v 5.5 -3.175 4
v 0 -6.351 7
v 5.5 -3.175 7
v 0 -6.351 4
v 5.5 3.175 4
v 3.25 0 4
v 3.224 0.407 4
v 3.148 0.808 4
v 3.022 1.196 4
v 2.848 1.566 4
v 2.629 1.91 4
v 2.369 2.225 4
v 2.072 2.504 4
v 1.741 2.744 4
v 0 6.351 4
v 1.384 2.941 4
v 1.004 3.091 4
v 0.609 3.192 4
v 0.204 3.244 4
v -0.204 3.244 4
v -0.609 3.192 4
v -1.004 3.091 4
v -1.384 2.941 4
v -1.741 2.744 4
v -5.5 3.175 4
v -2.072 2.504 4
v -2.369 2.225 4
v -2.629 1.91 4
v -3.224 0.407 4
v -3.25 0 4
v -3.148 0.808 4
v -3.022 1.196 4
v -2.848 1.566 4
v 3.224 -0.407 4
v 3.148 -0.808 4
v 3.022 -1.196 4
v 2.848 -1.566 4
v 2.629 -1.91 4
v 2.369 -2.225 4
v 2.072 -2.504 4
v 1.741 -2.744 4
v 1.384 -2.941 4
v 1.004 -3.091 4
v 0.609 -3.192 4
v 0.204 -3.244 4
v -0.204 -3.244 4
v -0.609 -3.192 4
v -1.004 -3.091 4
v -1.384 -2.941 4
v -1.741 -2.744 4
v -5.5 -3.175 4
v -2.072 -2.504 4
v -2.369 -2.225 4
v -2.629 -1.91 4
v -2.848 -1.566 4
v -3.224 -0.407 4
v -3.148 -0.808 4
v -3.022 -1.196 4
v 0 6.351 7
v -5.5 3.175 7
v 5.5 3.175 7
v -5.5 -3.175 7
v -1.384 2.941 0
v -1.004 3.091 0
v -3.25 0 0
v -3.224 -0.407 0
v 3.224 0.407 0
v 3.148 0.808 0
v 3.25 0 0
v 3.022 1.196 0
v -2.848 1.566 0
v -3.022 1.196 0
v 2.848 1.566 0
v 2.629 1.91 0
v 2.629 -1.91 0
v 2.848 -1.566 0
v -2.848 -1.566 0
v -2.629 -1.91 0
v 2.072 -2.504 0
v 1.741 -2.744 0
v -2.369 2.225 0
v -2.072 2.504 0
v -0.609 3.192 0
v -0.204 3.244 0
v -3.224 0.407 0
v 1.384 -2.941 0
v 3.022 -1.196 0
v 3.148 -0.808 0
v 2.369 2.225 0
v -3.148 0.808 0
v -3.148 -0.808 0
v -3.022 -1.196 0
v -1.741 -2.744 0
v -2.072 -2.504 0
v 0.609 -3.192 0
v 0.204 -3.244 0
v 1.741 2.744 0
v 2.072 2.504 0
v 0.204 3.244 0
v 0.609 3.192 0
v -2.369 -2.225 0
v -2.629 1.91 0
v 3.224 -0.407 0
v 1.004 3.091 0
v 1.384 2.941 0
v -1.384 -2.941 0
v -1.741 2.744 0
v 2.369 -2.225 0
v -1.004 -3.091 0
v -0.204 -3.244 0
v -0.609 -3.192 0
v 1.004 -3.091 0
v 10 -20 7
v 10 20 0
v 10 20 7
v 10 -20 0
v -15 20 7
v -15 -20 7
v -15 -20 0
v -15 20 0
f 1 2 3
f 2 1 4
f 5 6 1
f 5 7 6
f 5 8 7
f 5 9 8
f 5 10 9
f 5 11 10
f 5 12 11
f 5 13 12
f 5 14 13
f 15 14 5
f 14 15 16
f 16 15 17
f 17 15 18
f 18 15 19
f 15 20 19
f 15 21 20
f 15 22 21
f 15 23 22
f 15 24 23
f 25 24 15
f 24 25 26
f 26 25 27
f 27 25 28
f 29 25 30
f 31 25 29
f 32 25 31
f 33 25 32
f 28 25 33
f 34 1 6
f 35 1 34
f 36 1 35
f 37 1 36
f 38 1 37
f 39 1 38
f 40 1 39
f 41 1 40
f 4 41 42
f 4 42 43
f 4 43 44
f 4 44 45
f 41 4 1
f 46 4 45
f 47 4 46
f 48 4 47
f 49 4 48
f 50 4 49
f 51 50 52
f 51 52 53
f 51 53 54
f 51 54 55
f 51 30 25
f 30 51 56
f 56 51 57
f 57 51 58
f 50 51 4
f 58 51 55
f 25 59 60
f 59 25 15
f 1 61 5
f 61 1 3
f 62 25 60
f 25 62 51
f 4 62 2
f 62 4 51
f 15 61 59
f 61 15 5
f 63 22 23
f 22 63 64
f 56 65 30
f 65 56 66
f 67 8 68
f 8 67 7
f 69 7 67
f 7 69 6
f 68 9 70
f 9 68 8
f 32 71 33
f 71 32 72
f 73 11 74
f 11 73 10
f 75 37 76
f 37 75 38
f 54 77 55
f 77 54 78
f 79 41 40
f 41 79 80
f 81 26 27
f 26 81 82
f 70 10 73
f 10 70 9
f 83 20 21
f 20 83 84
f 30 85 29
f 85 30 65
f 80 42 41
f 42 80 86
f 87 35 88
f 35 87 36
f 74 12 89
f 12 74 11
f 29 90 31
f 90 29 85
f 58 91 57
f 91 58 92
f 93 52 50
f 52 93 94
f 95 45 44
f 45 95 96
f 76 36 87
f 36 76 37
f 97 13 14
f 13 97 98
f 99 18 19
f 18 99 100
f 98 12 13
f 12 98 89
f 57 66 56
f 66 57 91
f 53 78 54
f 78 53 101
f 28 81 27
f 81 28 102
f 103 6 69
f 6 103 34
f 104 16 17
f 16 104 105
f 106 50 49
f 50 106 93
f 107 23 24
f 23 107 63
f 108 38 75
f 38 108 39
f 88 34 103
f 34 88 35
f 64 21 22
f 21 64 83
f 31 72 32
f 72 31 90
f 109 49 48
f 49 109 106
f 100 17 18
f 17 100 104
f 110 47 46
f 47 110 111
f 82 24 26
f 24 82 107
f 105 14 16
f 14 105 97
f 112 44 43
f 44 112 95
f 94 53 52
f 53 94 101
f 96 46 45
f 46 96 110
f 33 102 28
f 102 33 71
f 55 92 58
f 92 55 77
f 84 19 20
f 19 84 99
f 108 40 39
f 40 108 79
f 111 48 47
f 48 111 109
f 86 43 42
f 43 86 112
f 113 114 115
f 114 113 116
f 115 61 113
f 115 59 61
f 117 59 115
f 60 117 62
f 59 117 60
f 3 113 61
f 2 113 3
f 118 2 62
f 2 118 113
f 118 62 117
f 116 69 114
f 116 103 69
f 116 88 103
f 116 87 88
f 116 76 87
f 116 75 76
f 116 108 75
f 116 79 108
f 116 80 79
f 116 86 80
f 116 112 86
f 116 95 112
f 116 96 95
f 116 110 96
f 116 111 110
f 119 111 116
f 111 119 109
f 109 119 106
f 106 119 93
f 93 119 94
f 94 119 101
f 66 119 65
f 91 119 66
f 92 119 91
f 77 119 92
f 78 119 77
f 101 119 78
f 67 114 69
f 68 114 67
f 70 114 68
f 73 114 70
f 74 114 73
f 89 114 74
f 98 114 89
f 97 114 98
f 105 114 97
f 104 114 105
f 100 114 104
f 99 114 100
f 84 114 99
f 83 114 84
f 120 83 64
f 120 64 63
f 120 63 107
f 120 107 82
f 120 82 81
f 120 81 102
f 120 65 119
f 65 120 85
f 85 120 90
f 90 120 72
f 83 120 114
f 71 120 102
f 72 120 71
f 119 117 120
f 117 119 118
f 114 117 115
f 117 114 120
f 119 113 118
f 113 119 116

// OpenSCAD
resolution_factor = 1.00;

module quarter_inch_nut_cutout()
{
    union()
    {
        translate([0, 0, -20])
            cylinder(r = 6.5/2, h = 21, $fn = 50*resolution_factor);
        
        for (i = [-60,0,60])
        {
            translate([0, 0, 5.65/2])
            rotate(i, [0, 0, 1])
                cube([11, tan(30)*11, 5.65], center = true);
        }
    }
}

module mountHold(l, w, h)
{
    cube([l, w, h]);        
}    


module poly_square(by, bx, ty, tx)
{
    polyhedron(
       points=[
                //Buttom Points
              [ 0, 0, 0 ],  //0
              [ 0, by, 0 ],  //1
              [ bx, by, 0 ],  //2
              [ bx, 0, 0 ],  //3
                //Top Points1
              [ 0, 0, ty ],  //4
              [ 0, by, ty ],  //5
              [ bx, by, tx ],  //6
              [ bx, 0, tx ]], //7
        faces=[
              [0,1,2,3],  // bottom
              [7,6,5,4],  // top
              [4,5,1,0],  // x0
              [5,6,2,1],  // parax
              [6,7,3,2],  // paray
              [7,4,0,3]] // y0
    );    
}

module camera_cutout()
{
    width = 39.5;
    height = 39.5;
    length = 68;
    cable_well_depth = 4.0;
    cable_well_width= 20.0;
    
    //How much do we pull back 
    translate([0, 3, 0])
    
    union()
    {
        //Basic block of electronics
        translate([0, length/2, 0])
        cube([width, length, height], center = true);
        
        //Channel for cables between electronics
        translate([0, length/2.0, 0])
        cube([width+cable_well_depth, length, cable_well_width], center = true);
        translate([0, length/2.0, 0])
        cube([cable_well_width, length, height+cable_well_depth], center = true);
        
        //Lens hole
        translate([0, 0.01, 0])
        rotate(90, [1, 0, 0])
        cylinder(r = 12.5, h = 20, $fn = 50);
        
        //Screwholes
        zz = 33.5/2;
        translate([-zz, 0, zz])
        rotate(90, [1, 0.01, 0])
        cylinder(r = 3.5/2, h = 4, $fn = 50);
        translate([zz, 0.01, -zz])
        rotate(90, [1, 0, 0])
        cylinder(r = 3.5/2, h = 4, $fn = 50);
        
    }
}

module camera()
{
    width = 46;
    depth = 35.0;
    difference()
    {
        union()
        {
            translate([0, depth/2, 0])
            cube([width, depth, width], center = true);
        }
        camera_cutout();
    }
}

/*POLYHEDRA BOX DIMENSIONS*/
aby = 50;
abx = 40;
aty = 27;
atx = 5;

/*CAMERA BOXES DIMENSIONS*/
dispH = 35;
dispV = 30;
distV = 44;

module boxANDpoly(){

    union(){
        color( "PaleGreen", 1.0 ) {
            translate([-30, 0, 0])
            poly_square(aby, abx, aty, atx);
                    }   
        color( "MediumPurple", 1.0 ) {
            translate([15, 25, 27])
            rotate([30, 0, 90])
            camera();
        }
     }
}

module unit(){
    difference(){    
        translate([0, 14, 0])
        rotate([0, 0, 35])
        boxANDpoly();
        translate([-50, -70, -10])
        cube([70, 70, 70]);
    }
}


//unit();
//mirror([0, 1, 0]) unit();

     //SCREWBOLD CUTOUT
module holder(){
     difference(){
        translate([-15, -20, 0])
        mountHold(25, 40, 7);
        translate([0, 0, 4])
        quarter_inch_nut_cutout(); 
         }
}

holder();
